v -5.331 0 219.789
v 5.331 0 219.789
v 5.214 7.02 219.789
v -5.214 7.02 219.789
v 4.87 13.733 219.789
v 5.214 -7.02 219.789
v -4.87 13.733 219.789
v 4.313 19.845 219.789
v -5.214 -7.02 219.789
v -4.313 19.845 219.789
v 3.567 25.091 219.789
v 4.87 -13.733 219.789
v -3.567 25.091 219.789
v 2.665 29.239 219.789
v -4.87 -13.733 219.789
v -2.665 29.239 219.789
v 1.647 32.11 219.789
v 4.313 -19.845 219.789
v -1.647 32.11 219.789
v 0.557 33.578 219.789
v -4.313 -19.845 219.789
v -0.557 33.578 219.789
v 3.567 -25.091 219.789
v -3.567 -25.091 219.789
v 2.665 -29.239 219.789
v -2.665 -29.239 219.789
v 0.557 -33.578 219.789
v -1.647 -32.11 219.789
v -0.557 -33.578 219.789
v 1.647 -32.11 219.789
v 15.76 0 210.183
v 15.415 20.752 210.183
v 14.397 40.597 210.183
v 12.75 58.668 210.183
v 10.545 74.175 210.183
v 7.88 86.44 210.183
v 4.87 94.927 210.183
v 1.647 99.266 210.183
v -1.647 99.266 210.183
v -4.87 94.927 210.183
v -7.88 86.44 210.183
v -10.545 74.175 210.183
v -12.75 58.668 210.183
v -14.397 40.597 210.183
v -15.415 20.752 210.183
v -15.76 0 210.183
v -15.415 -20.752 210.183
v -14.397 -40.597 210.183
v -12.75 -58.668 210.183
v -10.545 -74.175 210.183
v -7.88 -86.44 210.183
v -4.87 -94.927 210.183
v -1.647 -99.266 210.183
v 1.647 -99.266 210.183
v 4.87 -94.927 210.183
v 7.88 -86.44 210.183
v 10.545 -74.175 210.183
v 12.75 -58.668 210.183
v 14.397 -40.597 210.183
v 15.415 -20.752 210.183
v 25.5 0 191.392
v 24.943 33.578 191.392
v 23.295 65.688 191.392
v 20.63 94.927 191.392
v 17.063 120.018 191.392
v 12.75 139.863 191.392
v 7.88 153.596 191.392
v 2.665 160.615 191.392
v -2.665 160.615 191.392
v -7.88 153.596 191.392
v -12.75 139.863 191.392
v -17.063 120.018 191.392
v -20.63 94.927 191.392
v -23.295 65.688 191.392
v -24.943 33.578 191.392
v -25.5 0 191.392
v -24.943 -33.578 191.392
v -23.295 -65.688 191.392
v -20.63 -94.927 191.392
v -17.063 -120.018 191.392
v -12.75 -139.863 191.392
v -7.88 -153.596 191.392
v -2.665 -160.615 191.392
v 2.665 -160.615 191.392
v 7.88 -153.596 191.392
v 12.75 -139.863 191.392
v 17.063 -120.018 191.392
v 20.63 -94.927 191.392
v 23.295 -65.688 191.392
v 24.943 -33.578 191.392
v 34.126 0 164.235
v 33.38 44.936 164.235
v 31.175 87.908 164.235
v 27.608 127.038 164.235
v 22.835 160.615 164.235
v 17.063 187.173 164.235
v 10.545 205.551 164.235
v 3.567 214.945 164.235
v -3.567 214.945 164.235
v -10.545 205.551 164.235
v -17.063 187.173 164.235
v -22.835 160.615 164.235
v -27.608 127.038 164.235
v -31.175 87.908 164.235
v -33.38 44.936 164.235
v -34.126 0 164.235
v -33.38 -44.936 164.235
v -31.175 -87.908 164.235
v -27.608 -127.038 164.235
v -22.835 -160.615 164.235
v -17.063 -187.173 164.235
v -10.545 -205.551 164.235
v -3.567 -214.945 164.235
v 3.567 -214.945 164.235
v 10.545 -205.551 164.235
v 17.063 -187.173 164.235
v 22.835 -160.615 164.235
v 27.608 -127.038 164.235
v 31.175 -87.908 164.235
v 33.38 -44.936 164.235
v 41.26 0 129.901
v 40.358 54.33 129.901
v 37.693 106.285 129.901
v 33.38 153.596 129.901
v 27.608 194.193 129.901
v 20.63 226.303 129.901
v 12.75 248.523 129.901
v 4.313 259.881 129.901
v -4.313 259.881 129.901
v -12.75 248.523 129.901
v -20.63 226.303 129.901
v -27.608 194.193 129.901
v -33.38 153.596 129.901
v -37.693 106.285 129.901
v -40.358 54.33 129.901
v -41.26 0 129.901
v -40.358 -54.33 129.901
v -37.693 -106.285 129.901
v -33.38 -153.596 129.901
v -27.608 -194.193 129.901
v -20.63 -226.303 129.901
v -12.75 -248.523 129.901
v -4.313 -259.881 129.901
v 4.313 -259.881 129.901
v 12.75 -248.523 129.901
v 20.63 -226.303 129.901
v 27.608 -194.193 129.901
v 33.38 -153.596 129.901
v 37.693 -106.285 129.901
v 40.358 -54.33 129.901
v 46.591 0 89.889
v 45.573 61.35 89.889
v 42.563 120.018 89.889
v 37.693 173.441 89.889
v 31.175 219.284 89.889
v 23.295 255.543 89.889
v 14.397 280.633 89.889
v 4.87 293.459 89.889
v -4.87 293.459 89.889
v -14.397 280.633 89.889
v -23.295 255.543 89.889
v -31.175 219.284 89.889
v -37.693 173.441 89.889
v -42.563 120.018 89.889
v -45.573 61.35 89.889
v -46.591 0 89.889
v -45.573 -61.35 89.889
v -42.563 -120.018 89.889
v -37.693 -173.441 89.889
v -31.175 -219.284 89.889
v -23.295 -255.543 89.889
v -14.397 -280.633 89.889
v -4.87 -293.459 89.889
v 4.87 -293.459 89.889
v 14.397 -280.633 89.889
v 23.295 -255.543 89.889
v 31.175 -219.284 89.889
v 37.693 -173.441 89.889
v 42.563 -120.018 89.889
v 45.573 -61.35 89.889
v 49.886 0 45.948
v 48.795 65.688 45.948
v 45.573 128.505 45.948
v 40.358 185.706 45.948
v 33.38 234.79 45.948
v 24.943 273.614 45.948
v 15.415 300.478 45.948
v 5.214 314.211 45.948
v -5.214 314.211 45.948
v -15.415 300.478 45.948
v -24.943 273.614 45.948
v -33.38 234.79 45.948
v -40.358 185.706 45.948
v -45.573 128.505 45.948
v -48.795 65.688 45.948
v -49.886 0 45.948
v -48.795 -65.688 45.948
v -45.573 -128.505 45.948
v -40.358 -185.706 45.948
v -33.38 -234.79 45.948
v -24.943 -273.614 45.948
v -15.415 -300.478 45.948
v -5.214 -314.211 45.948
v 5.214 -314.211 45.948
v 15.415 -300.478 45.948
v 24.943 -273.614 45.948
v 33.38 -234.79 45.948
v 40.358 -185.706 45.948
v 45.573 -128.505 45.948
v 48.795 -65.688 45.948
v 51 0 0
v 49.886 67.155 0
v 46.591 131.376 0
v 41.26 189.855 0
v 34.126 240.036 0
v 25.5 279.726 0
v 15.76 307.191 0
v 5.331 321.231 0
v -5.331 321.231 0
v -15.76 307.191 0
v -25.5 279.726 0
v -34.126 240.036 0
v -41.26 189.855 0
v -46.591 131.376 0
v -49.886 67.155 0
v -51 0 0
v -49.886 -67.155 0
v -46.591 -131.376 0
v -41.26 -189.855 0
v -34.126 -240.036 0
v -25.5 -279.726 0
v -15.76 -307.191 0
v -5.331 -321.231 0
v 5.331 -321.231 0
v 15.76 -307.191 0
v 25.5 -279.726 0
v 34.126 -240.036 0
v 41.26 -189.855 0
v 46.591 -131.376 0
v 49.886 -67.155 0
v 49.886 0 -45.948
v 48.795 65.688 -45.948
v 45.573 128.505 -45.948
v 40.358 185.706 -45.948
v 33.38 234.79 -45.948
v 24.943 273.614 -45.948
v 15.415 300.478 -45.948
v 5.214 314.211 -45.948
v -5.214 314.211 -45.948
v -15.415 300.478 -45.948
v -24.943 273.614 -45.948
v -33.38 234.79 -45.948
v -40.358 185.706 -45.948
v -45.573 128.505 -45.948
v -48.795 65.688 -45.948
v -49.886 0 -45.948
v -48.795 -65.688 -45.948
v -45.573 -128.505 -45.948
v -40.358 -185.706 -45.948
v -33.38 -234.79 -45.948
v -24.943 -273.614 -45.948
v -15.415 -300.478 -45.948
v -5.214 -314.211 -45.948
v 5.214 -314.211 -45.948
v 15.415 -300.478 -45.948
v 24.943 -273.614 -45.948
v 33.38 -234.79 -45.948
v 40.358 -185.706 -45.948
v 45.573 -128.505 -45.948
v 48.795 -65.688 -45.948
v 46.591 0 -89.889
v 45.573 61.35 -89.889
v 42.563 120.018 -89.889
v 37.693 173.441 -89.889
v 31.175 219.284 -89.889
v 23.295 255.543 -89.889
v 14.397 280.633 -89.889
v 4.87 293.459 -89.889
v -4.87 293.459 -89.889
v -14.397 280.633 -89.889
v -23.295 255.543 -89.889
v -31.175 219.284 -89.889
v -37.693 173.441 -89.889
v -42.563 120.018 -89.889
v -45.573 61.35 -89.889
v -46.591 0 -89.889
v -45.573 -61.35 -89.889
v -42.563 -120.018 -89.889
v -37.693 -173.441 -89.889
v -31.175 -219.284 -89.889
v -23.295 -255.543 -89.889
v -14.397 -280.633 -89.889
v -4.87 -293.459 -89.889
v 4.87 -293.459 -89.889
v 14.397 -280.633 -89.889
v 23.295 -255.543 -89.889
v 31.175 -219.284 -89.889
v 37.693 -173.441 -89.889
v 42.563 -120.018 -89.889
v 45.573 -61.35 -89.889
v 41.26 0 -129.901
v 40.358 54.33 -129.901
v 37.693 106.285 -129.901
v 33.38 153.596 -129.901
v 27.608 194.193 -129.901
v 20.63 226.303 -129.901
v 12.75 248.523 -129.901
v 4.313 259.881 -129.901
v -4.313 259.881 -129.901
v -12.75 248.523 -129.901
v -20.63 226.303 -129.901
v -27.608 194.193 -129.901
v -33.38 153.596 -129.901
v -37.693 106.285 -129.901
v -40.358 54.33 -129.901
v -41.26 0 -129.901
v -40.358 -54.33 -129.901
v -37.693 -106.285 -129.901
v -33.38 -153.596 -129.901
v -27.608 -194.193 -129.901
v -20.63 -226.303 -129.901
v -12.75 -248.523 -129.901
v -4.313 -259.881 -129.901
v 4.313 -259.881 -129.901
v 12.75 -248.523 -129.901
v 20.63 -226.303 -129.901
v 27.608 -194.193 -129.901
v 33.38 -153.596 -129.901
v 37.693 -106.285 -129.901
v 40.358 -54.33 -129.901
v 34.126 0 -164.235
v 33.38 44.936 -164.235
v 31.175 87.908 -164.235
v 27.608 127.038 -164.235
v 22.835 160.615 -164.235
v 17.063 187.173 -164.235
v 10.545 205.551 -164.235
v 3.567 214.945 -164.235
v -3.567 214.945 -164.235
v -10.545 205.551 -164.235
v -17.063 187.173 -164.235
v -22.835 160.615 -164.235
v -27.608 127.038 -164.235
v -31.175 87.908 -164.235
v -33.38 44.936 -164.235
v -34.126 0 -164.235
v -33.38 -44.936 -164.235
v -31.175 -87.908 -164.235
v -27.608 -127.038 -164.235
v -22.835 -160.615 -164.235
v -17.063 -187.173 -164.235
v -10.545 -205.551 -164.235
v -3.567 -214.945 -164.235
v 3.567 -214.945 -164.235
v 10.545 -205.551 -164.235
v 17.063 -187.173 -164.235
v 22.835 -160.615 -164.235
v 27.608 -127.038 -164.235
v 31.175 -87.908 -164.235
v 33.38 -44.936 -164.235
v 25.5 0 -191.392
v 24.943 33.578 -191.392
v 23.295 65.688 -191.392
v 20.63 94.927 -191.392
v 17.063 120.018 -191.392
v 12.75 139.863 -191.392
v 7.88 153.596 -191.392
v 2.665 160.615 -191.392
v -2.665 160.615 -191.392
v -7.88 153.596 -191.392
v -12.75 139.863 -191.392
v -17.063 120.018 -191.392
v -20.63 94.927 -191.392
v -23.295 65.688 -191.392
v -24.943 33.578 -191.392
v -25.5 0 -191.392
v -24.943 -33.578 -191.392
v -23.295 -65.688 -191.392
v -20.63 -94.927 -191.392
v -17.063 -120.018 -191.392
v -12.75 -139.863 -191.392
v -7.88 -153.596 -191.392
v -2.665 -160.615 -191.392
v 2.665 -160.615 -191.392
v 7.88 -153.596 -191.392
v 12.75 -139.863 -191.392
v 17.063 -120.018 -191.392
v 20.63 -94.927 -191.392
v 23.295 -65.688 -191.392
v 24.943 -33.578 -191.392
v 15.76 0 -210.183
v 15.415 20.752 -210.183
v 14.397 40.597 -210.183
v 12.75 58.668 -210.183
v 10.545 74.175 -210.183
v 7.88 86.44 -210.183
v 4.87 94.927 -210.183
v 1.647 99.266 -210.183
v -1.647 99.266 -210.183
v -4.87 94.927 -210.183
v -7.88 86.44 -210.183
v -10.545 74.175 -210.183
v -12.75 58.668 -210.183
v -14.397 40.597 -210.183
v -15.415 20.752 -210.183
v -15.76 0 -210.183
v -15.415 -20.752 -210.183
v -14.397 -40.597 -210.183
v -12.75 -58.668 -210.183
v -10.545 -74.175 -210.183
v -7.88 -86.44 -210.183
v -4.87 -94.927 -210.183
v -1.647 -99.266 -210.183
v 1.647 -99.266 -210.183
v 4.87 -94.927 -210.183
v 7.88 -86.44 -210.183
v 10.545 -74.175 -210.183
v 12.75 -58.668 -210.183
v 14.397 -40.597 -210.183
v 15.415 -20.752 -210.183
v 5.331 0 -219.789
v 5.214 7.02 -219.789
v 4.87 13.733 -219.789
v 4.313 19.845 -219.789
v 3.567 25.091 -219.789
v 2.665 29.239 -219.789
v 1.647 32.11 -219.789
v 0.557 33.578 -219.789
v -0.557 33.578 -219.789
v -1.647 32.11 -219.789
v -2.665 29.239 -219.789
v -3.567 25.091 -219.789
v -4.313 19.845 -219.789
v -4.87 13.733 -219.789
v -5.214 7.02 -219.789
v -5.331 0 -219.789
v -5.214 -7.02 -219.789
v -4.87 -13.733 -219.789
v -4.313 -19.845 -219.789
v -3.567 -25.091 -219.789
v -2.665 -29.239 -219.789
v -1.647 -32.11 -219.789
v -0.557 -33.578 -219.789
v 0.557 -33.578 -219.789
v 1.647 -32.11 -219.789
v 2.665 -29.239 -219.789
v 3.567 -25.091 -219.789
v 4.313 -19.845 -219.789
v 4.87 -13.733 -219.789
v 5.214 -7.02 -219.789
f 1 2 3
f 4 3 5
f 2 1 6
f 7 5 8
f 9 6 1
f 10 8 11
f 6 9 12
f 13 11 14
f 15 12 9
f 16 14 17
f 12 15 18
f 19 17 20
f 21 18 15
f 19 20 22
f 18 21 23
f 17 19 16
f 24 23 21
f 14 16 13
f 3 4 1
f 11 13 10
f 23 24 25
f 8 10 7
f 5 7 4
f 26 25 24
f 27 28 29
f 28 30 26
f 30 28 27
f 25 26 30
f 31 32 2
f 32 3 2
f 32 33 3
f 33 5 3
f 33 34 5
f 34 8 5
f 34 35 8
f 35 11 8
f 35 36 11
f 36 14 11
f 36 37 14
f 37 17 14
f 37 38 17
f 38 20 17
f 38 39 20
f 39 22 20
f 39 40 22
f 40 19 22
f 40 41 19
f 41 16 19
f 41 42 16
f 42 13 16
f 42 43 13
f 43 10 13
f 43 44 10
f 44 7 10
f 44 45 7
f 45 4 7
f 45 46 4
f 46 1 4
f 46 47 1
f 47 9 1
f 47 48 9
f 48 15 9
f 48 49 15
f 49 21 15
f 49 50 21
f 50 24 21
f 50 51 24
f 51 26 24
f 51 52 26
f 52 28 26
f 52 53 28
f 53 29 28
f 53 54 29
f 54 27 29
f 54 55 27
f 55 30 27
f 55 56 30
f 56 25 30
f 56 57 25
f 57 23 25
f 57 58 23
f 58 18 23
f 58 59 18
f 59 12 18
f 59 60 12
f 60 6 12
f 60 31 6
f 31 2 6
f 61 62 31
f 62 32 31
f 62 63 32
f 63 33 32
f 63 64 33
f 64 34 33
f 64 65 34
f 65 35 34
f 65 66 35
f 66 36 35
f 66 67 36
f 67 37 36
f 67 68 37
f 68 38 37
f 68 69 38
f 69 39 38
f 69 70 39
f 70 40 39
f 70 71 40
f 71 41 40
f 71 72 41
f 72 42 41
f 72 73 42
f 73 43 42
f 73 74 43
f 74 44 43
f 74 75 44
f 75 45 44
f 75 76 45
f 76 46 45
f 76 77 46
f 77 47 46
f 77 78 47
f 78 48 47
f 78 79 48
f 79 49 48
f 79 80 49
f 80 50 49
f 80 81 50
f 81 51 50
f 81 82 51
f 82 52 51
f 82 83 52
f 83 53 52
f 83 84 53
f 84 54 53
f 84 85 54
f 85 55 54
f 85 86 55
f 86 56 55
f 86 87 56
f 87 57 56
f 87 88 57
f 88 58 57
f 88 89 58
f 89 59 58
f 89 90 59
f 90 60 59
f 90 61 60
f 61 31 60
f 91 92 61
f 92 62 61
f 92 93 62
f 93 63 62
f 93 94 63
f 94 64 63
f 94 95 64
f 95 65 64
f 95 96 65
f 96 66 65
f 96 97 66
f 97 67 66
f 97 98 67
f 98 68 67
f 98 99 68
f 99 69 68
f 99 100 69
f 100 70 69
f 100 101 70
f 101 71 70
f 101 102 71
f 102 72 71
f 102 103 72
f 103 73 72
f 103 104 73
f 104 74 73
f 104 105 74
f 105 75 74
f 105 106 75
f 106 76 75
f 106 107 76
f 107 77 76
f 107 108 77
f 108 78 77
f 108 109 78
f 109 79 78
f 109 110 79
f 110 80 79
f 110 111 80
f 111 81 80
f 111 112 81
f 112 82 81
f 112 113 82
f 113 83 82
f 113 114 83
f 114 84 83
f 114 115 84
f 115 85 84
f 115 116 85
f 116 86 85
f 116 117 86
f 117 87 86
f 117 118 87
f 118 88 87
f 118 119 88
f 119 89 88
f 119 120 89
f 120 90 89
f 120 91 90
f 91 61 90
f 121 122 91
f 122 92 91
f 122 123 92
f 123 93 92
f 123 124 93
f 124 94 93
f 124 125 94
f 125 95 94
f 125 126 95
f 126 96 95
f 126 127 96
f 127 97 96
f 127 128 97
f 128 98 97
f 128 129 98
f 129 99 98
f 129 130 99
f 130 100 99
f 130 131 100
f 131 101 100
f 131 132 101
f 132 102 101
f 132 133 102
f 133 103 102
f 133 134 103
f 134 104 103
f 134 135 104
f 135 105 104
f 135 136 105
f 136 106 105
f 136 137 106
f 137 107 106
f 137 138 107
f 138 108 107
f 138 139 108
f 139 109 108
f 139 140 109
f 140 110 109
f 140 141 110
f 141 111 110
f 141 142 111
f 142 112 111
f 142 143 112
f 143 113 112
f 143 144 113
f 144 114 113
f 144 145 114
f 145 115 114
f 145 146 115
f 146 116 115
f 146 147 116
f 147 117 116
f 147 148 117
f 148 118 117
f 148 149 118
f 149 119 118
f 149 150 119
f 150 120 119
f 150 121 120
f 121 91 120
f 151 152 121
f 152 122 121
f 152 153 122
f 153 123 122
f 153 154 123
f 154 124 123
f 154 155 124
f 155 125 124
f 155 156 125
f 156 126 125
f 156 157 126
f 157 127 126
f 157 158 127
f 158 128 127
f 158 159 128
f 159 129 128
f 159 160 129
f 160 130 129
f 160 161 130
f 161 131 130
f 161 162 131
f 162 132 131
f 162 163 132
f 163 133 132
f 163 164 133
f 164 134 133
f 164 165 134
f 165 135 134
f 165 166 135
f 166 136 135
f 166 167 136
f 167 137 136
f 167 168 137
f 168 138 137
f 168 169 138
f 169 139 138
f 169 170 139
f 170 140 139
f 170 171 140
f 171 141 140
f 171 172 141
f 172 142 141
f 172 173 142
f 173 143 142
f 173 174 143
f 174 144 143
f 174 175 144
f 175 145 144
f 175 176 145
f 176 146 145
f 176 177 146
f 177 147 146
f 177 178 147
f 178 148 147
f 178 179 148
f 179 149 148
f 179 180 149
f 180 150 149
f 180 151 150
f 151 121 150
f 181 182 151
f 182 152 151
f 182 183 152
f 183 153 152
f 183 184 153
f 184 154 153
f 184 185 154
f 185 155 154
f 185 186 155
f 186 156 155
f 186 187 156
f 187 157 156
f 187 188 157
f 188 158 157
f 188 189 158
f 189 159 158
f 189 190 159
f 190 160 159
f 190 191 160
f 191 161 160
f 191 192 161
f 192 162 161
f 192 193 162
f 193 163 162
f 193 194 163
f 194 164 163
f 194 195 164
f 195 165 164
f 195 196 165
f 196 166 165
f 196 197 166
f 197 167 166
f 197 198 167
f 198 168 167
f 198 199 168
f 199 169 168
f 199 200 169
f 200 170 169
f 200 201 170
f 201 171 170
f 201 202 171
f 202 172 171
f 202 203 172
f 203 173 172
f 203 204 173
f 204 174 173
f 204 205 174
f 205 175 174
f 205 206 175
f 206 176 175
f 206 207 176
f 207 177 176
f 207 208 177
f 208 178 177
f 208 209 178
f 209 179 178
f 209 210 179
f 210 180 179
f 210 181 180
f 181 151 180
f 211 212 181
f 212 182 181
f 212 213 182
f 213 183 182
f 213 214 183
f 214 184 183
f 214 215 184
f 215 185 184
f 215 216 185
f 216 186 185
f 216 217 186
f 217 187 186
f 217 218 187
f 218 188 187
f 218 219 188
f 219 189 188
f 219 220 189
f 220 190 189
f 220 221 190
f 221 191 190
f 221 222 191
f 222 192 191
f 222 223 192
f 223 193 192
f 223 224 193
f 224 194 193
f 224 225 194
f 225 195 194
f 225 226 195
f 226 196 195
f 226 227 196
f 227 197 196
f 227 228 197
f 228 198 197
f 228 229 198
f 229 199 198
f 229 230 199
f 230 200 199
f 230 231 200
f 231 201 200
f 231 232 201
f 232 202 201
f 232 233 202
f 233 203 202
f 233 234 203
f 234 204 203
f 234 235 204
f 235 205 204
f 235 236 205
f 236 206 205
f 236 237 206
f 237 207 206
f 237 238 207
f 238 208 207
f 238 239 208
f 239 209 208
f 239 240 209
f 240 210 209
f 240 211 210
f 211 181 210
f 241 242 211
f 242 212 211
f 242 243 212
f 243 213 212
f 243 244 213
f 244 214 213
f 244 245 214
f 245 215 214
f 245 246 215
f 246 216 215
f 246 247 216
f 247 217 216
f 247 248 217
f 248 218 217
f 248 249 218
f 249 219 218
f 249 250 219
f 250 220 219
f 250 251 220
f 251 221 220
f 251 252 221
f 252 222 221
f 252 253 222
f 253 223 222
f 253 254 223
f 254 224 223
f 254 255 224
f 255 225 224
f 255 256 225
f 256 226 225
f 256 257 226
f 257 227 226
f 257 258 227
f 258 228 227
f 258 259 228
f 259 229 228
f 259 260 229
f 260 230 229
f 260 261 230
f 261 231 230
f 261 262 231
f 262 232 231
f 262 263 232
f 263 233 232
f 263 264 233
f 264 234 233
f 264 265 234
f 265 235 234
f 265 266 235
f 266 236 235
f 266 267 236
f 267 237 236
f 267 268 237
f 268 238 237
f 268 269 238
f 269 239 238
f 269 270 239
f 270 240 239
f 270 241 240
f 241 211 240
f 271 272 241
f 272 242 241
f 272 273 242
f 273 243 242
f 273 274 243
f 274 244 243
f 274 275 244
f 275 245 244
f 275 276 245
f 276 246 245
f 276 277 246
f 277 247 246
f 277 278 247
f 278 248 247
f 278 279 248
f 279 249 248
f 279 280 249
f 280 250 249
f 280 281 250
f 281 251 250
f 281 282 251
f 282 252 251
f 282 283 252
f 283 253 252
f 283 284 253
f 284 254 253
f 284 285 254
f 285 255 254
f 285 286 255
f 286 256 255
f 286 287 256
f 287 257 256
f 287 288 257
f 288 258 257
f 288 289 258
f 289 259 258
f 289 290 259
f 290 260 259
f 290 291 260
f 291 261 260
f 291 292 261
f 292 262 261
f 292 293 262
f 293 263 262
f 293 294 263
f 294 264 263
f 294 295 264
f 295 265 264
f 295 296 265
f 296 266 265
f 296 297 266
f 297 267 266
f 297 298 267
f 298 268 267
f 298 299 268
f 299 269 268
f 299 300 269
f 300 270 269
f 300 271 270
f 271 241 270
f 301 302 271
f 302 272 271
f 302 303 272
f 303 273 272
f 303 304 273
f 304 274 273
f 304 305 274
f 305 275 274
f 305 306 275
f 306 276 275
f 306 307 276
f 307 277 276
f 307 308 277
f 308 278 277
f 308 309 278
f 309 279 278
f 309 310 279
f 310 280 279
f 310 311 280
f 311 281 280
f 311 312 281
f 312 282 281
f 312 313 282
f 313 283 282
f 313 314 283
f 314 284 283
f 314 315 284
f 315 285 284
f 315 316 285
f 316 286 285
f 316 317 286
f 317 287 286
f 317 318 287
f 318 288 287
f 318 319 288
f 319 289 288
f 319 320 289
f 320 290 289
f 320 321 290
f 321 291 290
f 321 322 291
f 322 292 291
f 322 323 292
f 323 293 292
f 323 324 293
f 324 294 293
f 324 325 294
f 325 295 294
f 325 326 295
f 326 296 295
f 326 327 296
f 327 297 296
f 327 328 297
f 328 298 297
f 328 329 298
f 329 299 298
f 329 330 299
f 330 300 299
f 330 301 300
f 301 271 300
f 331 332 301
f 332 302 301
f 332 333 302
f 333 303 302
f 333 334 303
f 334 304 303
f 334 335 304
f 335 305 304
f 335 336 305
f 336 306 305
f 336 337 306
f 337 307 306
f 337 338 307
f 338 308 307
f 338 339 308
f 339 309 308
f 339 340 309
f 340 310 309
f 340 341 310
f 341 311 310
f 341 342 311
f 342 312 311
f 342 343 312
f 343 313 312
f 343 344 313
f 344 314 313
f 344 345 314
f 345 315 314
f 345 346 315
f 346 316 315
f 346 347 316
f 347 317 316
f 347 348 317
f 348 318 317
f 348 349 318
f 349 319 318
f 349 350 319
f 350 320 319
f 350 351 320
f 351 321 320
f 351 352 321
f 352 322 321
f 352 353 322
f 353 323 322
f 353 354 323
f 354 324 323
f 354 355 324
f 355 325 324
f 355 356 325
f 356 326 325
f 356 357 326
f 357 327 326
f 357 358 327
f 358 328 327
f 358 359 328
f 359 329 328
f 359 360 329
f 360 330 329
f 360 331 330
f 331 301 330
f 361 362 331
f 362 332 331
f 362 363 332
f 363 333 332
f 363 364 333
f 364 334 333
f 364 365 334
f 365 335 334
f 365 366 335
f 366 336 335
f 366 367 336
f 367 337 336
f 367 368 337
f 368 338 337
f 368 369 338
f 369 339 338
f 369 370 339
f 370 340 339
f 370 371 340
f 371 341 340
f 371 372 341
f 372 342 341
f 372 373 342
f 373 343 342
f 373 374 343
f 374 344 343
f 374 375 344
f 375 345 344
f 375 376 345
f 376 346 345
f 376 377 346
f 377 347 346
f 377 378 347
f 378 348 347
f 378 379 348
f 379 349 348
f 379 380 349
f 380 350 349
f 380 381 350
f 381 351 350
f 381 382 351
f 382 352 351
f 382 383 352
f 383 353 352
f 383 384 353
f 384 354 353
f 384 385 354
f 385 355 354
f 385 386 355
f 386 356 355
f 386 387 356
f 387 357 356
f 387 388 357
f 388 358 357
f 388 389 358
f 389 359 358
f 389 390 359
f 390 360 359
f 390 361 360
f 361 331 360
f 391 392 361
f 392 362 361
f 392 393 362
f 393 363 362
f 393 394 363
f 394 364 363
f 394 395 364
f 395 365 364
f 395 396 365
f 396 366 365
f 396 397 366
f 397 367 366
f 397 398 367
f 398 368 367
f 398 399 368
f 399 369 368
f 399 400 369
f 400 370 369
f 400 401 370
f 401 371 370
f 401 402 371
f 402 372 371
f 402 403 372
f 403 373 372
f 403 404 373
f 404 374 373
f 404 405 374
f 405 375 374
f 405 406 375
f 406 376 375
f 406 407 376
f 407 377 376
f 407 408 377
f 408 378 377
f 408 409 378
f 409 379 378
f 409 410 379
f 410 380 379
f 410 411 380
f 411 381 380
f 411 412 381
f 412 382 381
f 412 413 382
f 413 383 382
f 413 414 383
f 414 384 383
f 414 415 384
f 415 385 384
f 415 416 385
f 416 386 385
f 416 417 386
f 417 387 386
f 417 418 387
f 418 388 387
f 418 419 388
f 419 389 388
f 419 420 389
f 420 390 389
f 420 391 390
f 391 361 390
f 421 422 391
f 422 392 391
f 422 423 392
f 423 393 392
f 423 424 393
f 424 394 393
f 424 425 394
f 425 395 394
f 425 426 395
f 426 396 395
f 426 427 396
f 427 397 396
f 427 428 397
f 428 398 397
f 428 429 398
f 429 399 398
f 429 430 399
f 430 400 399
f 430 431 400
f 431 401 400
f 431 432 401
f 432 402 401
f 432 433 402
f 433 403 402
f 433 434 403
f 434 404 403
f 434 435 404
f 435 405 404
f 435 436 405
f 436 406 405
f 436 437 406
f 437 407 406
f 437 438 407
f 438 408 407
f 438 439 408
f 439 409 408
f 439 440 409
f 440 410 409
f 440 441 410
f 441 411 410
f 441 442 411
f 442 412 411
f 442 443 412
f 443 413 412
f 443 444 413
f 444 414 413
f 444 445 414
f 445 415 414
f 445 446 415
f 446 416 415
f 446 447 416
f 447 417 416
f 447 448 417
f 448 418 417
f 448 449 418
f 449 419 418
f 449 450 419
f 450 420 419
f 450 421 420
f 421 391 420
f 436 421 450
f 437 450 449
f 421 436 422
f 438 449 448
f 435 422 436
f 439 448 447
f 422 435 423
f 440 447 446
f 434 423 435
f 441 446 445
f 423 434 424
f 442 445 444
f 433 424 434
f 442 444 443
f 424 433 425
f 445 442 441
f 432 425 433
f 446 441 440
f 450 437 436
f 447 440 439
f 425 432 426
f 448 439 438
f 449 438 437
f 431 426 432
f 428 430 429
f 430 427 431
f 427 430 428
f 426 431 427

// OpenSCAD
// Generated by SolidPython 1.0.1 on 2020-07-29 00:46:46


scale(v = [3, 19, 13]) {
	sphere(r = 17);
}
/***********************************************
*********      SolidPython code:      **********
************************************************
 
# import packages: SolidPython
from solid import *
from solid.utils import *
from itertools import chain, combinations, permutations


class Resize:

    def __init__(self, scad_file):
        self.scad_file = scad_file
        #self.scad_file = import_scad(scad_file)
        # cone/cylinder param:
        self.r1 = 0
        self.r2 = 0
        self.h = 0
        # rectangular prism param:
        self.w = 0
        self.l = 0
        # ellipse param:
        self.r = 0

    # import OpenScad code (file name corresponds to shape)


    # classify shape + parameters
    def assign(self, param1, param2, param3):
        if self.scad_file == 'cone.scad':
            self.r1 = param1
            self.r2 = param2
            self.h = param3
        elif self.scad_file == 'cylinder.scad':
            self.r1 = param1
            self.r2 = param2
            self.h = param3
        elif self.scad_file == 'rectangularPrism.scad':
            self.h = param1
            self.l = param2
            self.w = param3
        else:
            self.r = param1
            self.h = param2

    # resize parameters
    def iterate(self):
        x = range(3, 20, 2)
        i = 1
        if self.scad_file == 'cone.scad':
            tempList = list(permutations(x, 2))
            for temp in tempList:
                param1 = temp[0]
                param2 = temp[1]
                filepath = 'produced_scad_files/' + 'cone' + str(param1) + '_' + str(param2) + '_' + '.scad'
                scad_render_to_file(cylinder(h=param1, r1=param2, r2=0), filepath)

        elif self.scad_file == 'cylinder.scad':
            tempList = list(permutations(x, 3))
            for temp in tempList:
                param1 = temp[0]
                param2 = temp[1]
                filepath = 'produced_scad_files/' + 'cylinder' + str(param1) + '_' + str(param2) + '_' + '.scad'
                scad_render_to_file(cylinder(h=param1, r1=param2, r2=param2), filepath)

        elif self.scad_file == 'rectangularPrism.scad':
            tempList = list(permutations(x, 3))
            for temp in tempList:
                param1 = temp[0]
                param2 = temp[1]
                param3 = temp[2]
                filepath = 'produced_scad_files/' + 'rectangularPrism' + str(param1) + '_' + str(param2) + '_' + str(
                    param3) + '.scad'
                scad_render_to_file(cube(size=(param1, param2, param3)), filepath)

        elif self.scad_file == 'ellipse.scad':
            tempList = list(permutations(x, 4))
            for temp in tempList:
                param1 = temp[0]
                param2 = temp[1]
                param3 = temp[2]
                param4 = temp[3]
                filepath = 'produced_scad_files/' + 'ellipse' + str(param1) + '_' + str(param2) + '_' + str(param3) + '_' + str(param4) + '.scad'
                scad_render_to_file(scale([param1, param2, param3])(sphere(r=param4)), filepath)

    def render_to_scadfile(self):
        scad_render_to_file(scad, 'example.scad') 
 
************************************************/
